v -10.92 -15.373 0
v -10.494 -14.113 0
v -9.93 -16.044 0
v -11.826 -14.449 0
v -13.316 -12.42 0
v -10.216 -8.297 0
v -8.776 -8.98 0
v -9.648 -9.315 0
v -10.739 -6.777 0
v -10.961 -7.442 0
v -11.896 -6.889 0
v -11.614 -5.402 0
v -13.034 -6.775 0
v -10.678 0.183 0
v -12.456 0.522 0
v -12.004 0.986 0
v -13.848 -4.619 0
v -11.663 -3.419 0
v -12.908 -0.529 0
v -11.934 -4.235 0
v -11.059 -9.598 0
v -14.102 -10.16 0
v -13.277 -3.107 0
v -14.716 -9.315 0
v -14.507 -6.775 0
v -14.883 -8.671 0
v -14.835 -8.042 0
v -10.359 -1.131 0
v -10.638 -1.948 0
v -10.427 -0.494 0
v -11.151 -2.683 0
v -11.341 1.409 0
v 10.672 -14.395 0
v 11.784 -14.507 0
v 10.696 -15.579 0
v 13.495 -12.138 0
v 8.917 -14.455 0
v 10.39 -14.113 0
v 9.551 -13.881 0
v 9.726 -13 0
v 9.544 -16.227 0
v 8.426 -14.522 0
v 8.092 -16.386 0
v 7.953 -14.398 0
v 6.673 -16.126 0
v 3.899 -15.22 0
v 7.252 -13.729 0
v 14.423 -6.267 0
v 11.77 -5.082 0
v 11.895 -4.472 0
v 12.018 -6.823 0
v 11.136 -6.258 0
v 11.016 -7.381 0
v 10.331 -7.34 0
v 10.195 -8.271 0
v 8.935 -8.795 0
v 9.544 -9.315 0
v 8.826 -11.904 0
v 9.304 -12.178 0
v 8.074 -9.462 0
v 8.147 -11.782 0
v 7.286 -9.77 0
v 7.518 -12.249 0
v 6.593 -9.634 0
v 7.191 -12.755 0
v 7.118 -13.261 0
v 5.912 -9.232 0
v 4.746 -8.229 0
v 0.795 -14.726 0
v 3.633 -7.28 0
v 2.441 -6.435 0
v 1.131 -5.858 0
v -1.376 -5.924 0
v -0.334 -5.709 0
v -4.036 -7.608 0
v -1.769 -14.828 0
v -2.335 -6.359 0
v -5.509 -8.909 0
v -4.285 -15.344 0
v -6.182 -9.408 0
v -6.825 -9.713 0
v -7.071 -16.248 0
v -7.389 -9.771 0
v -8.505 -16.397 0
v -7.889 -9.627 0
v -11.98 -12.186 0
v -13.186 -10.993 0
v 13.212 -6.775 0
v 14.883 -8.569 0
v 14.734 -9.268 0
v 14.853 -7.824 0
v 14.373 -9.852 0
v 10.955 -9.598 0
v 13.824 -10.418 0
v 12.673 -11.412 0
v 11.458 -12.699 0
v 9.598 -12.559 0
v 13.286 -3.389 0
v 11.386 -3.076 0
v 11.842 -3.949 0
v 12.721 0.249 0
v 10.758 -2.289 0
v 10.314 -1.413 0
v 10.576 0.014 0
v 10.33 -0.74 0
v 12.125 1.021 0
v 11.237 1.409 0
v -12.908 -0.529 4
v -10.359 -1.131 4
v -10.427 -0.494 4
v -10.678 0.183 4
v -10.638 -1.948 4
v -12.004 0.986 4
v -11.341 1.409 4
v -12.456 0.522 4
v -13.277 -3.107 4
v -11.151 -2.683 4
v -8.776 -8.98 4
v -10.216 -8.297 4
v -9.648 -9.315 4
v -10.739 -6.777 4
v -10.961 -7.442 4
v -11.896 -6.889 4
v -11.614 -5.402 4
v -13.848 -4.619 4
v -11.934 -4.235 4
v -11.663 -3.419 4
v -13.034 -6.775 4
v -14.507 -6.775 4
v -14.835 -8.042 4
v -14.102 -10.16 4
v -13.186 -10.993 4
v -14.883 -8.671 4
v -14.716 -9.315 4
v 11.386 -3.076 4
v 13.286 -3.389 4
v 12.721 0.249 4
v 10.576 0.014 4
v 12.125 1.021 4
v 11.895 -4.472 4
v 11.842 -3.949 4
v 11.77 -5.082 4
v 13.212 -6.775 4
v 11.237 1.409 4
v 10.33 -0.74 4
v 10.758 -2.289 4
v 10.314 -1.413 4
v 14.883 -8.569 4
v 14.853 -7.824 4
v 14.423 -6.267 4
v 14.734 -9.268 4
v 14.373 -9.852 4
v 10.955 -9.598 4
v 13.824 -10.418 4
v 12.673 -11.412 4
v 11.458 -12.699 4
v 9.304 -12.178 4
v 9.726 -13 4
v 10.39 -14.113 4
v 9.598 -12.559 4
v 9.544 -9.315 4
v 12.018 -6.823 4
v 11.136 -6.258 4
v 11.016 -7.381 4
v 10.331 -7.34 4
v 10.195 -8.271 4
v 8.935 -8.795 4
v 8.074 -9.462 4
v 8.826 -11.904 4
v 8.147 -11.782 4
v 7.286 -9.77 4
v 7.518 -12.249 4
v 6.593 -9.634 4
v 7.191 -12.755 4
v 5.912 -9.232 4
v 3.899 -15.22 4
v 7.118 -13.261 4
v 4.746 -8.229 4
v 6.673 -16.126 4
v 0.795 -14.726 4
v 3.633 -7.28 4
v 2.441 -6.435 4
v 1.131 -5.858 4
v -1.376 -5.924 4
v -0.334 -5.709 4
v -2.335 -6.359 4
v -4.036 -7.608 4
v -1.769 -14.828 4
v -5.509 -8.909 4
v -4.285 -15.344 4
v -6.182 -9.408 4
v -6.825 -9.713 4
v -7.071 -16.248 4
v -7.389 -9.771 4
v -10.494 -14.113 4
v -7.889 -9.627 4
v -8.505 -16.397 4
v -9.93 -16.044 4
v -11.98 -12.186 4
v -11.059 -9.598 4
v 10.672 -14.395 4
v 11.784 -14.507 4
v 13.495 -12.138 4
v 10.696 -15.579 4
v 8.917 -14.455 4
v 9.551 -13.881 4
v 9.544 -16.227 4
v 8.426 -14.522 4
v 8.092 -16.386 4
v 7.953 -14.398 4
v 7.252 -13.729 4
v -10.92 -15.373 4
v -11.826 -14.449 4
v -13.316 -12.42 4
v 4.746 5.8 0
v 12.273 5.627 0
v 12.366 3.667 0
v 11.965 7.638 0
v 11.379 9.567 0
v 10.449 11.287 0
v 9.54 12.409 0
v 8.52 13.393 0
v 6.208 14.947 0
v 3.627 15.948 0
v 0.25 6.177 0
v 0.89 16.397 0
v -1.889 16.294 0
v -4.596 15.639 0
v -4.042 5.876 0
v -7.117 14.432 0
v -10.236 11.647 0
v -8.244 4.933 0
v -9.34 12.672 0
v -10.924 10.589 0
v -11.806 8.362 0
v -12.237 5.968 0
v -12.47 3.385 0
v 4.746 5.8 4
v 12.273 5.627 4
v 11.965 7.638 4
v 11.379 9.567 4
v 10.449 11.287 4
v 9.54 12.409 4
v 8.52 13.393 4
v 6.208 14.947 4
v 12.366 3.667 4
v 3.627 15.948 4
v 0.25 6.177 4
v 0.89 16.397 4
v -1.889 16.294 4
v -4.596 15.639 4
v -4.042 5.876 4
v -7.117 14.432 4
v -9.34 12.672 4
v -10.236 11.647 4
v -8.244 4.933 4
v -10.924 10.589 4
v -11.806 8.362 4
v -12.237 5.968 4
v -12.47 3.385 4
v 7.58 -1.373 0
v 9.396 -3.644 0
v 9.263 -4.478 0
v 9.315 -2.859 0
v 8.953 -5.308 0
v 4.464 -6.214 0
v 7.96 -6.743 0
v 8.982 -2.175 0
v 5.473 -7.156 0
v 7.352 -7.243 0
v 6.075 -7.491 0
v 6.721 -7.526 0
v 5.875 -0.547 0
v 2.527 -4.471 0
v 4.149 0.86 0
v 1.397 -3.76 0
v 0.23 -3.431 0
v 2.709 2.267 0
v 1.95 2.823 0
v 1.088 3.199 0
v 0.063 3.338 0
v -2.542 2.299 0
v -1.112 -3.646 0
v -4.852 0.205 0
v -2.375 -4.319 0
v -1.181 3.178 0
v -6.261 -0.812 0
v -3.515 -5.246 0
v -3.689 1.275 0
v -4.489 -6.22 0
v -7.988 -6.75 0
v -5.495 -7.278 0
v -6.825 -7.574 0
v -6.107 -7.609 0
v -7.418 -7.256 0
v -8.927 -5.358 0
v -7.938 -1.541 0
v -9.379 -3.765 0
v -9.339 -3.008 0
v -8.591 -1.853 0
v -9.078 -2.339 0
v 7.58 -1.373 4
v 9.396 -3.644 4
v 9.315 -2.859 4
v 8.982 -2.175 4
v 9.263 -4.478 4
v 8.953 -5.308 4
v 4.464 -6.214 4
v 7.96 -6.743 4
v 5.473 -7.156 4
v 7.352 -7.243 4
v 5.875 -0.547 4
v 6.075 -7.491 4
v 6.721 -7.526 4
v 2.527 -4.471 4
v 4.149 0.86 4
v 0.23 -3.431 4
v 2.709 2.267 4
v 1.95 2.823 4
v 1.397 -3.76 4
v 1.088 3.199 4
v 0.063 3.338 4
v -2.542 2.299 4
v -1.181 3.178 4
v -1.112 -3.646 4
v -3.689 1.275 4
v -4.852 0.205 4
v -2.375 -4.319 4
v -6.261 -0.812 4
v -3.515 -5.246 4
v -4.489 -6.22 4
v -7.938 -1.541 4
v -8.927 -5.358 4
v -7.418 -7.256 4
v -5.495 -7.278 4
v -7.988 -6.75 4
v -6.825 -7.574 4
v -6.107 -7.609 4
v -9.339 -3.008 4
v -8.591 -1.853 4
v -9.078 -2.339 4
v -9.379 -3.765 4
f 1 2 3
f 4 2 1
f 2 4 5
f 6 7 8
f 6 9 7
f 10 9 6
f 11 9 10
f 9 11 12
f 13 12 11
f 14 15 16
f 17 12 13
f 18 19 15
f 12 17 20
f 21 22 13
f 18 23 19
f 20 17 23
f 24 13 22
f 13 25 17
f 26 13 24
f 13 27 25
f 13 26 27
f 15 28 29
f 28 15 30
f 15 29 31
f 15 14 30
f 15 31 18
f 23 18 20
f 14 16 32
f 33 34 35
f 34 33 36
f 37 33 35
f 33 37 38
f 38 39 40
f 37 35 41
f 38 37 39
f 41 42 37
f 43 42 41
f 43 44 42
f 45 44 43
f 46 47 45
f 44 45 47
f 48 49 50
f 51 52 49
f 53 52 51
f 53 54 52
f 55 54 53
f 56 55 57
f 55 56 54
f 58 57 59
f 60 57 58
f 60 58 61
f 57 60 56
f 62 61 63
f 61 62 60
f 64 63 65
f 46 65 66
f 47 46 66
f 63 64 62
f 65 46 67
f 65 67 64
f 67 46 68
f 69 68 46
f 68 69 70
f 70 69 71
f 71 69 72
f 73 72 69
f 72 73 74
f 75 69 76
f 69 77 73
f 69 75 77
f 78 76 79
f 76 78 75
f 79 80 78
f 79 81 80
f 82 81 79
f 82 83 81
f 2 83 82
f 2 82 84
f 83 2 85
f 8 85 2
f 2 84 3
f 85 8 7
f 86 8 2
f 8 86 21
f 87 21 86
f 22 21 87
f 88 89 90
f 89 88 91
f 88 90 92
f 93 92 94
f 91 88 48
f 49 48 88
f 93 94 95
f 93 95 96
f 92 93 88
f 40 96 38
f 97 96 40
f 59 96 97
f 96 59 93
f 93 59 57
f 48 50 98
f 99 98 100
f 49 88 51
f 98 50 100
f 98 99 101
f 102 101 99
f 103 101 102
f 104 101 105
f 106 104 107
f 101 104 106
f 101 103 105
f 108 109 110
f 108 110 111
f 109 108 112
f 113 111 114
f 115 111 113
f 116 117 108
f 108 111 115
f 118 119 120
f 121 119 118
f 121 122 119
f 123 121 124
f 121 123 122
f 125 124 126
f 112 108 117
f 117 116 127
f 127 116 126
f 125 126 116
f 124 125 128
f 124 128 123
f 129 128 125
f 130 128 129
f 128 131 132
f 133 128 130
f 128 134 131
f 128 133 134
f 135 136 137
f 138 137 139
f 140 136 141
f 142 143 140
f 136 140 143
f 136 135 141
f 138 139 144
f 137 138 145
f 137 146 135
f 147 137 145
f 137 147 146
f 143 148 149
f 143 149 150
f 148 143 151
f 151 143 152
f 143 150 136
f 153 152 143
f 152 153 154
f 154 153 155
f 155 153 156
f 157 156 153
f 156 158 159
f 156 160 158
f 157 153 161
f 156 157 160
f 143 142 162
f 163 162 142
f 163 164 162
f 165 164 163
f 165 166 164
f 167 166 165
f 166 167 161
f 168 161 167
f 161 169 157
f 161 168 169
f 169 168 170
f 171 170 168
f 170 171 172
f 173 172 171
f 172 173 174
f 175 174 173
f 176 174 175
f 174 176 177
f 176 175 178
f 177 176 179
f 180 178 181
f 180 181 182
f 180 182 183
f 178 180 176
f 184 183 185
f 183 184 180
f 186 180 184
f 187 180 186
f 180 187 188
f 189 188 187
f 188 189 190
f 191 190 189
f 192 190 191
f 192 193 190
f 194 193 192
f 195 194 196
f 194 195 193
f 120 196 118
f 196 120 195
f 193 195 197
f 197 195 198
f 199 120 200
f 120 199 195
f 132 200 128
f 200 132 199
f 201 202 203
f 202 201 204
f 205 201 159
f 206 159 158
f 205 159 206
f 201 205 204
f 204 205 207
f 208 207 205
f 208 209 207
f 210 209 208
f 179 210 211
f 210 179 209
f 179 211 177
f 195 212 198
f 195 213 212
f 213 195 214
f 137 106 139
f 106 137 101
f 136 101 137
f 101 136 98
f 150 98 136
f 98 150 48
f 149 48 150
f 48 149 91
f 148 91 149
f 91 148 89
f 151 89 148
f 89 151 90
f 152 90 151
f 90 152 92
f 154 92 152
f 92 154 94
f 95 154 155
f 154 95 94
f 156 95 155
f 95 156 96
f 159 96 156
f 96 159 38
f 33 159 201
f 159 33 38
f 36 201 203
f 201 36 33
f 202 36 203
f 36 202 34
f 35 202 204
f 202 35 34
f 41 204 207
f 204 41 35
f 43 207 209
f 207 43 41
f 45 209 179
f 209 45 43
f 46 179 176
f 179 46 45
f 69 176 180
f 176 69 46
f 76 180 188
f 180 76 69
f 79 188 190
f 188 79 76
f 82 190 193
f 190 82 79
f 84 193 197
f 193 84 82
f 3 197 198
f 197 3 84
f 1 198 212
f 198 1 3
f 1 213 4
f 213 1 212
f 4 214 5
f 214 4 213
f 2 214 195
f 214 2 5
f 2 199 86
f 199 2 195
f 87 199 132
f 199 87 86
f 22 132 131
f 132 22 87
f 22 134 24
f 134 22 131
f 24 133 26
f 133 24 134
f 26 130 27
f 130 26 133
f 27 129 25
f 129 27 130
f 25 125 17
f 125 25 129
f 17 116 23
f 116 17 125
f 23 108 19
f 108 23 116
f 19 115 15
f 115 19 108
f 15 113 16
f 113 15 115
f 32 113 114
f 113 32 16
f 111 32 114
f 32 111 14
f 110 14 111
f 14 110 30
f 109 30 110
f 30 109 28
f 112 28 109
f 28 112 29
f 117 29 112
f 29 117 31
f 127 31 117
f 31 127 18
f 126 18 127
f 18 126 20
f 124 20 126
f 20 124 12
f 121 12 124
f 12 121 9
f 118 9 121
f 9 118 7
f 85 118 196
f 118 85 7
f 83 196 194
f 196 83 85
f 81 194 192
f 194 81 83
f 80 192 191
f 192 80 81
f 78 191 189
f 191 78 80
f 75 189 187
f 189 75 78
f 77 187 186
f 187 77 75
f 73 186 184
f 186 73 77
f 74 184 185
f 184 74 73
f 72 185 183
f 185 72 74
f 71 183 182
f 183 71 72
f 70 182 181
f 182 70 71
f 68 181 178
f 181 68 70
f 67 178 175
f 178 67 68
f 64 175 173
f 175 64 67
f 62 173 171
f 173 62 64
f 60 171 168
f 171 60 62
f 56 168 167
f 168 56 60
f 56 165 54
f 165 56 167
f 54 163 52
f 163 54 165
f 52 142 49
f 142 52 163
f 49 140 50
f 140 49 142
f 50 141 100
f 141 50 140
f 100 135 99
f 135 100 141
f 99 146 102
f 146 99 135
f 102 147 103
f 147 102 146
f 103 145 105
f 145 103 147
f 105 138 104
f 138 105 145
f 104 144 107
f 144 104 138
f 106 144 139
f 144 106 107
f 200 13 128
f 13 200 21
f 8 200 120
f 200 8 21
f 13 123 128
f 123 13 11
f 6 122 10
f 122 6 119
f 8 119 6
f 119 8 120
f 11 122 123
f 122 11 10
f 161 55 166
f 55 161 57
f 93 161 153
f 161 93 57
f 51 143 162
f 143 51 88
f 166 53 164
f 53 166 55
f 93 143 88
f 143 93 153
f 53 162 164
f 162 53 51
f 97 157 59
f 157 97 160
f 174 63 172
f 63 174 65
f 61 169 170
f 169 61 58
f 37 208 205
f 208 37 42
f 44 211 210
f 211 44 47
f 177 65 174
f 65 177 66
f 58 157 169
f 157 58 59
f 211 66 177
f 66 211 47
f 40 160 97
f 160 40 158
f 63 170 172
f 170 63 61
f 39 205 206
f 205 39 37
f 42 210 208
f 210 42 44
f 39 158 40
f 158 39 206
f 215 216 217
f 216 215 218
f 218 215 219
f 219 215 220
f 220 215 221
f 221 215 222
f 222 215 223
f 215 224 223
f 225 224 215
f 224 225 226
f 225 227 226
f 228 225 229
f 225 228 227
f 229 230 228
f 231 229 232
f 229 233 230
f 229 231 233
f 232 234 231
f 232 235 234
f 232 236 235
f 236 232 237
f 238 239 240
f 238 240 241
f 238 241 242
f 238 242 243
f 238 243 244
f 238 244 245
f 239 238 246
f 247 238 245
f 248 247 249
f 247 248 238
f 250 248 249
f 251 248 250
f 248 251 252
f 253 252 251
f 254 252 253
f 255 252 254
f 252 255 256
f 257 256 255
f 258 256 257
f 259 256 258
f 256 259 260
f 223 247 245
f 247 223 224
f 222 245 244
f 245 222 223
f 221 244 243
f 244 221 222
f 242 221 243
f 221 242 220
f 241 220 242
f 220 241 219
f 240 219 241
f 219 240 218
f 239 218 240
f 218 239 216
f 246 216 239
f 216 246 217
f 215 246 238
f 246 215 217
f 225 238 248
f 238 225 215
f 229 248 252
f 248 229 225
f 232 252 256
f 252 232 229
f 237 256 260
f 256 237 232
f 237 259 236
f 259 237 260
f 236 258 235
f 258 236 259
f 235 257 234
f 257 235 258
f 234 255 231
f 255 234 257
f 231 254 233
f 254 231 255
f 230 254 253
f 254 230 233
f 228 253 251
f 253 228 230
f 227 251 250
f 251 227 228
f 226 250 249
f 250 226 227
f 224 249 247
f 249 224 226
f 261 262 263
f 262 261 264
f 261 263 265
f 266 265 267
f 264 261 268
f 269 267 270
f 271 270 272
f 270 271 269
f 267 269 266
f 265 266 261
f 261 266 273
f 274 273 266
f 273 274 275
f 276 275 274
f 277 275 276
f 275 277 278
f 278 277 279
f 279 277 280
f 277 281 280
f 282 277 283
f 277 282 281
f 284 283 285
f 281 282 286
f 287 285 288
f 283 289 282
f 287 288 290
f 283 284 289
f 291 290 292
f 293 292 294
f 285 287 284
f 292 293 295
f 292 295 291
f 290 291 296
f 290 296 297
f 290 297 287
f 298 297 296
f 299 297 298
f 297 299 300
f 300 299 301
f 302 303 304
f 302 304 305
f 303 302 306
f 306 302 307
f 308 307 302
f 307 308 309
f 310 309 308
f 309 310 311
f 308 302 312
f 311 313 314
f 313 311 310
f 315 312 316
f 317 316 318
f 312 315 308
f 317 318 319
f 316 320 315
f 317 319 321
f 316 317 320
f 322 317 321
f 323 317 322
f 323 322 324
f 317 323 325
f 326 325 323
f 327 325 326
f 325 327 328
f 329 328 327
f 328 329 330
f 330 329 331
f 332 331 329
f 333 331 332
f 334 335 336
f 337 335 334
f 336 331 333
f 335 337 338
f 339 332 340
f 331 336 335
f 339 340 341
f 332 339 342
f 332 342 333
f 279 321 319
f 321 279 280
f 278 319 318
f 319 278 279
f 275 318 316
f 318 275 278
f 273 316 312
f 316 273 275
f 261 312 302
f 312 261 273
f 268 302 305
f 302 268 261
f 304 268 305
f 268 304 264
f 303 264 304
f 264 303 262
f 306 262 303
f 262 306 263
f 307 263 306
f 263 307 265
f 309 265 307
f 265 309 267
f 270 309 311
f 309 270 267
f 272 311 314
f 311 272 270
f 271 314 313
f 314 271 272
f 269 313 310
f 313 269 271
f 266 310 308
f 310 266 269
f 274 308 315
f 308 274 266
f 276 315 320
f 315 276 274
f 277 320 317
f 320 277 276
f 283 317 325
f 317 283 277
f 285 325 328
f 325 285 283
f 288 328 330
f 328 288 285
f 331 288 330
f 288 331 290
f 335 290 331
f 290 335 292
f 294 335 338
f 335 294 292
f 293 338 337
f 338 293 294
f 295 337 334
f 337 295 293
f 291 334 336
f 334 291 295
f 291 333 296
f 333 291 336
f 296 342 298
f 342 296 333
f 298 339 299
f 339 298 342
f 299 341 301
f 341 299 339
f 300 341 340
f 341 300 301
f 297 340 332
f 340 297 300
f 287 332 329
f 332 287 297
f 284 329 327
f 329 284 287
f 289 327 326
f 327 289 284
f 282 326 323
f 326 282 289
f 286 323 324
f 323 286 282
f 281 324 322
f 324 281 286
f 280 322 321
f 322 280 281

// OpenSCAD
scrumtrooper(4);

// Module names are of the form poly_<inkscape-path-id>().  As a result,
// you can associate a polygon in this OpenSCAD program with the corresponding
// SVG element in the Inkscape document by looking for the XML element with
// the attribute id="inkscape-path-id".

// fudge value is used to ensure that subtracted solids are a tad taller
// in the z dimension than the polygon being subtracted from.  This helps
// keep the resulting .stl file manifold.
fudge = 0.1;

module scrumtrooper_poly_Selection(h)
{
  scale([25.4/90, -25.4/90, 1]) union()
  {
    linear_extrude(height=h)
      polygon([[-33.094424,-44.902344],[-25.219053,-51.135742],[-16.283955,-55.413281],[-6.691904,-57.734727],[3.154326,-58.099844],[12.851963,-56.508398],[21.998232,-52.960156],[30.190361,-47.454883],[33.802756,-43.968286],[37.025576,-39.992344],[40.318232,-33.900469],[42.396826,-27.062344],[43.487295,-19.939219],[43.815576,-12.992344],[16.815576,-20.552344],[0.885889,-21.888125],[-14.321924,-20.821094],[-29.210986,-17.479687],[-44.184424,-11.992344],[-43.358643,-21.146563],[-41.830674,-29.628594],[-38.707080,-37.520000],[-36.267725,-41.269707],[-33.094424,-44.902344]]);
    linear_extrude(height=h)
      polygon([[20.815576,1.937656],[26.856826,4.863906],[31.825576,7.707656],[33.005947,10.129336],[33.292295,12.911719],[32.819971,15.867070],[31.724326,18.807656],[28.204482,23.893594],[26.050986,25.663477],[23.815576,26.667656],[21.526357,26.542969],[19.391826,25.355156],[15.815576,22.017656],[8.953076,15.842656],[4.950889,13.324219],[0.815576,12.157656],[-3.940049,12.919531],[-8.414424,15.305156],[-12.453799,18.587031],[-15.904424,22.037656],[-19.470674,25.787656],[-21.637705,26.959531],[-24.184424,26.837656],[-26.283604,25.711230],[-28.302861,23.918125],[-31.631924,18.983906],[-33.232236,13.339062],[-33.090557,10.657676],[-32.164424,8.287656],[-30.441924,6.566250],[-28.126924,5.458906],[-22.184424,2.877656],[-17.192236,-0.728125],[-13.071924,-4.518594],[-9.007861,-8.145938],[-4.184424,-11.262344],[0.224365,-11.826777],[3.853389,-11.335938],[6.909131,-10.001113],[9.598076,-8.033594],[14.701514,-3.045625],[20.815576,1.937656]]);
    difference()
    {
       linear_extrude(height=h)
         polygon([[-52.144424,33.007656],[-52.736143,30.722500],[-52.565674,28.496406],[-51.404424,24.007656],[-49.066924,16.367656],[-47.044424,11.007656],[-45.736924,1.875156],[-44.136299,-1.848281],[-42.534893,-3.493555],[-40.184424,-4.992344],[-37.836924,-0.649844],[-36.947236,1.749219],[-36.704424,4.007656],[-37.693018,6.902031],[-39.513174,9.507656],[-41.323955,12.113281],[-42.284424,15.007656],[-41.150518,19.141719],[-38.050674,24.012656],[-31.094424,31.817656],[-27.954424,34.111406],[-26.180986,34.620312],[-24.184424,34.417656],[-21.906201,33.335020],[-19.520518,31.569063],[-14.300674,26.958906],[-8.272705,22.530625],[-4.876865,20.992012],[-1.184424,20.227656],[4.007451,20.756719],[8.648076,22.802656],[12.872451,25.793594],[16.815576,29.157656],[20.948076,32.712656],[23.360264,34.135781],[25.815576,34.617656],[28.609639,33.526875],[31.660576,31.163906],[36.605576,26.007656],[39.459326,22.172656],[41.705576,18.007656],[42.146260,15.846992],[41.961045,13.993594],[40.344326,10.900156],[38.118232,8.110469],[36.545576,5.007656],[36.600889,2.622500],[37.475576,-0.048594],[39.815576,-4.992344],[42.963076,-3.616094],[45.075576,-0.882344],[47.075576,12.007656],[51.106826,22.205156],[52.628857,27.723906],[52.736143,30.363516],[52.205576,32.837656],[50.927139,34.908281],[48.983076,36.915156],[44.905576,40.437656],[40.598076,44.997656],[36.815576,50.007656],[37.815576,51.007656],[47.815576,43.007656],[41.753076,51.403906],[37.898701,55.201250],[33.815576,57.497656],[28.674014,58.062031],[23.643076,57.137656],[13.815576,53.927656],[2.815576,52.177656],[-6.266924,52.541406],[-15.184424,54.367656],[-25.053174,57.572656],[-30.134268,58.099844],[-35.184424,56.847656],[-38.693486,54.471562],[-41.904424,51.196406],[-47.184424,44.007656],[-37.184424,50.007656],[-42.448330,43.177656],[-46.723174,38.950156],[-49.968643,36.001406],[-52.144424,33.007656]]);
       translate([0, 0, -fudge])
         linear_extrude(height=h+2*fudge)
           polygon([[-46.184424,24.007656],[-39.184424,34.007656],[-34.184424,33.007656],[-36.198643,29.399219],[-38.838174,26.370156],[-42.150830,24.409844],[-46.184424,24.007656]]);
       translate([0, 0, -fudge])
         linear_extrude(height=h+2*fudge)
           polygon([[33.815576,33.007656],[38.815576,34.007656],[46.815576,24.007656],[42.582139,24.176406],[39.033076,26.152656],[36.125264,29.306406],[33.815576,33.007656]]);
       translate([0, 0, -fudge])
         linear_extrude(height=h+2*fudge)
           polygon([[31.595576,51.217656],[33.840889,49.183906],[34.460576,46.062656],[34.007881,44.499687],[32.965264,43.151406],[31.271553,42.180000],[28.865576,41.747656],[26.638838,43.402676],[25.479795,45.194687],[25.221455,46.987871],[25.696826,48.646406],[28.180732,51.016250],[29.855283,51.455918],[31.595576,51.217656]]);
    }
    linear_extrude(height=h)
      polygon([[-47.184424,43.007656],[-50.184424,40.007656],[-47.184424,43.007656]]);
  }
}

module scrumtrooper(h)
{
	scrumtrooper_poly_Selection(h);
}
